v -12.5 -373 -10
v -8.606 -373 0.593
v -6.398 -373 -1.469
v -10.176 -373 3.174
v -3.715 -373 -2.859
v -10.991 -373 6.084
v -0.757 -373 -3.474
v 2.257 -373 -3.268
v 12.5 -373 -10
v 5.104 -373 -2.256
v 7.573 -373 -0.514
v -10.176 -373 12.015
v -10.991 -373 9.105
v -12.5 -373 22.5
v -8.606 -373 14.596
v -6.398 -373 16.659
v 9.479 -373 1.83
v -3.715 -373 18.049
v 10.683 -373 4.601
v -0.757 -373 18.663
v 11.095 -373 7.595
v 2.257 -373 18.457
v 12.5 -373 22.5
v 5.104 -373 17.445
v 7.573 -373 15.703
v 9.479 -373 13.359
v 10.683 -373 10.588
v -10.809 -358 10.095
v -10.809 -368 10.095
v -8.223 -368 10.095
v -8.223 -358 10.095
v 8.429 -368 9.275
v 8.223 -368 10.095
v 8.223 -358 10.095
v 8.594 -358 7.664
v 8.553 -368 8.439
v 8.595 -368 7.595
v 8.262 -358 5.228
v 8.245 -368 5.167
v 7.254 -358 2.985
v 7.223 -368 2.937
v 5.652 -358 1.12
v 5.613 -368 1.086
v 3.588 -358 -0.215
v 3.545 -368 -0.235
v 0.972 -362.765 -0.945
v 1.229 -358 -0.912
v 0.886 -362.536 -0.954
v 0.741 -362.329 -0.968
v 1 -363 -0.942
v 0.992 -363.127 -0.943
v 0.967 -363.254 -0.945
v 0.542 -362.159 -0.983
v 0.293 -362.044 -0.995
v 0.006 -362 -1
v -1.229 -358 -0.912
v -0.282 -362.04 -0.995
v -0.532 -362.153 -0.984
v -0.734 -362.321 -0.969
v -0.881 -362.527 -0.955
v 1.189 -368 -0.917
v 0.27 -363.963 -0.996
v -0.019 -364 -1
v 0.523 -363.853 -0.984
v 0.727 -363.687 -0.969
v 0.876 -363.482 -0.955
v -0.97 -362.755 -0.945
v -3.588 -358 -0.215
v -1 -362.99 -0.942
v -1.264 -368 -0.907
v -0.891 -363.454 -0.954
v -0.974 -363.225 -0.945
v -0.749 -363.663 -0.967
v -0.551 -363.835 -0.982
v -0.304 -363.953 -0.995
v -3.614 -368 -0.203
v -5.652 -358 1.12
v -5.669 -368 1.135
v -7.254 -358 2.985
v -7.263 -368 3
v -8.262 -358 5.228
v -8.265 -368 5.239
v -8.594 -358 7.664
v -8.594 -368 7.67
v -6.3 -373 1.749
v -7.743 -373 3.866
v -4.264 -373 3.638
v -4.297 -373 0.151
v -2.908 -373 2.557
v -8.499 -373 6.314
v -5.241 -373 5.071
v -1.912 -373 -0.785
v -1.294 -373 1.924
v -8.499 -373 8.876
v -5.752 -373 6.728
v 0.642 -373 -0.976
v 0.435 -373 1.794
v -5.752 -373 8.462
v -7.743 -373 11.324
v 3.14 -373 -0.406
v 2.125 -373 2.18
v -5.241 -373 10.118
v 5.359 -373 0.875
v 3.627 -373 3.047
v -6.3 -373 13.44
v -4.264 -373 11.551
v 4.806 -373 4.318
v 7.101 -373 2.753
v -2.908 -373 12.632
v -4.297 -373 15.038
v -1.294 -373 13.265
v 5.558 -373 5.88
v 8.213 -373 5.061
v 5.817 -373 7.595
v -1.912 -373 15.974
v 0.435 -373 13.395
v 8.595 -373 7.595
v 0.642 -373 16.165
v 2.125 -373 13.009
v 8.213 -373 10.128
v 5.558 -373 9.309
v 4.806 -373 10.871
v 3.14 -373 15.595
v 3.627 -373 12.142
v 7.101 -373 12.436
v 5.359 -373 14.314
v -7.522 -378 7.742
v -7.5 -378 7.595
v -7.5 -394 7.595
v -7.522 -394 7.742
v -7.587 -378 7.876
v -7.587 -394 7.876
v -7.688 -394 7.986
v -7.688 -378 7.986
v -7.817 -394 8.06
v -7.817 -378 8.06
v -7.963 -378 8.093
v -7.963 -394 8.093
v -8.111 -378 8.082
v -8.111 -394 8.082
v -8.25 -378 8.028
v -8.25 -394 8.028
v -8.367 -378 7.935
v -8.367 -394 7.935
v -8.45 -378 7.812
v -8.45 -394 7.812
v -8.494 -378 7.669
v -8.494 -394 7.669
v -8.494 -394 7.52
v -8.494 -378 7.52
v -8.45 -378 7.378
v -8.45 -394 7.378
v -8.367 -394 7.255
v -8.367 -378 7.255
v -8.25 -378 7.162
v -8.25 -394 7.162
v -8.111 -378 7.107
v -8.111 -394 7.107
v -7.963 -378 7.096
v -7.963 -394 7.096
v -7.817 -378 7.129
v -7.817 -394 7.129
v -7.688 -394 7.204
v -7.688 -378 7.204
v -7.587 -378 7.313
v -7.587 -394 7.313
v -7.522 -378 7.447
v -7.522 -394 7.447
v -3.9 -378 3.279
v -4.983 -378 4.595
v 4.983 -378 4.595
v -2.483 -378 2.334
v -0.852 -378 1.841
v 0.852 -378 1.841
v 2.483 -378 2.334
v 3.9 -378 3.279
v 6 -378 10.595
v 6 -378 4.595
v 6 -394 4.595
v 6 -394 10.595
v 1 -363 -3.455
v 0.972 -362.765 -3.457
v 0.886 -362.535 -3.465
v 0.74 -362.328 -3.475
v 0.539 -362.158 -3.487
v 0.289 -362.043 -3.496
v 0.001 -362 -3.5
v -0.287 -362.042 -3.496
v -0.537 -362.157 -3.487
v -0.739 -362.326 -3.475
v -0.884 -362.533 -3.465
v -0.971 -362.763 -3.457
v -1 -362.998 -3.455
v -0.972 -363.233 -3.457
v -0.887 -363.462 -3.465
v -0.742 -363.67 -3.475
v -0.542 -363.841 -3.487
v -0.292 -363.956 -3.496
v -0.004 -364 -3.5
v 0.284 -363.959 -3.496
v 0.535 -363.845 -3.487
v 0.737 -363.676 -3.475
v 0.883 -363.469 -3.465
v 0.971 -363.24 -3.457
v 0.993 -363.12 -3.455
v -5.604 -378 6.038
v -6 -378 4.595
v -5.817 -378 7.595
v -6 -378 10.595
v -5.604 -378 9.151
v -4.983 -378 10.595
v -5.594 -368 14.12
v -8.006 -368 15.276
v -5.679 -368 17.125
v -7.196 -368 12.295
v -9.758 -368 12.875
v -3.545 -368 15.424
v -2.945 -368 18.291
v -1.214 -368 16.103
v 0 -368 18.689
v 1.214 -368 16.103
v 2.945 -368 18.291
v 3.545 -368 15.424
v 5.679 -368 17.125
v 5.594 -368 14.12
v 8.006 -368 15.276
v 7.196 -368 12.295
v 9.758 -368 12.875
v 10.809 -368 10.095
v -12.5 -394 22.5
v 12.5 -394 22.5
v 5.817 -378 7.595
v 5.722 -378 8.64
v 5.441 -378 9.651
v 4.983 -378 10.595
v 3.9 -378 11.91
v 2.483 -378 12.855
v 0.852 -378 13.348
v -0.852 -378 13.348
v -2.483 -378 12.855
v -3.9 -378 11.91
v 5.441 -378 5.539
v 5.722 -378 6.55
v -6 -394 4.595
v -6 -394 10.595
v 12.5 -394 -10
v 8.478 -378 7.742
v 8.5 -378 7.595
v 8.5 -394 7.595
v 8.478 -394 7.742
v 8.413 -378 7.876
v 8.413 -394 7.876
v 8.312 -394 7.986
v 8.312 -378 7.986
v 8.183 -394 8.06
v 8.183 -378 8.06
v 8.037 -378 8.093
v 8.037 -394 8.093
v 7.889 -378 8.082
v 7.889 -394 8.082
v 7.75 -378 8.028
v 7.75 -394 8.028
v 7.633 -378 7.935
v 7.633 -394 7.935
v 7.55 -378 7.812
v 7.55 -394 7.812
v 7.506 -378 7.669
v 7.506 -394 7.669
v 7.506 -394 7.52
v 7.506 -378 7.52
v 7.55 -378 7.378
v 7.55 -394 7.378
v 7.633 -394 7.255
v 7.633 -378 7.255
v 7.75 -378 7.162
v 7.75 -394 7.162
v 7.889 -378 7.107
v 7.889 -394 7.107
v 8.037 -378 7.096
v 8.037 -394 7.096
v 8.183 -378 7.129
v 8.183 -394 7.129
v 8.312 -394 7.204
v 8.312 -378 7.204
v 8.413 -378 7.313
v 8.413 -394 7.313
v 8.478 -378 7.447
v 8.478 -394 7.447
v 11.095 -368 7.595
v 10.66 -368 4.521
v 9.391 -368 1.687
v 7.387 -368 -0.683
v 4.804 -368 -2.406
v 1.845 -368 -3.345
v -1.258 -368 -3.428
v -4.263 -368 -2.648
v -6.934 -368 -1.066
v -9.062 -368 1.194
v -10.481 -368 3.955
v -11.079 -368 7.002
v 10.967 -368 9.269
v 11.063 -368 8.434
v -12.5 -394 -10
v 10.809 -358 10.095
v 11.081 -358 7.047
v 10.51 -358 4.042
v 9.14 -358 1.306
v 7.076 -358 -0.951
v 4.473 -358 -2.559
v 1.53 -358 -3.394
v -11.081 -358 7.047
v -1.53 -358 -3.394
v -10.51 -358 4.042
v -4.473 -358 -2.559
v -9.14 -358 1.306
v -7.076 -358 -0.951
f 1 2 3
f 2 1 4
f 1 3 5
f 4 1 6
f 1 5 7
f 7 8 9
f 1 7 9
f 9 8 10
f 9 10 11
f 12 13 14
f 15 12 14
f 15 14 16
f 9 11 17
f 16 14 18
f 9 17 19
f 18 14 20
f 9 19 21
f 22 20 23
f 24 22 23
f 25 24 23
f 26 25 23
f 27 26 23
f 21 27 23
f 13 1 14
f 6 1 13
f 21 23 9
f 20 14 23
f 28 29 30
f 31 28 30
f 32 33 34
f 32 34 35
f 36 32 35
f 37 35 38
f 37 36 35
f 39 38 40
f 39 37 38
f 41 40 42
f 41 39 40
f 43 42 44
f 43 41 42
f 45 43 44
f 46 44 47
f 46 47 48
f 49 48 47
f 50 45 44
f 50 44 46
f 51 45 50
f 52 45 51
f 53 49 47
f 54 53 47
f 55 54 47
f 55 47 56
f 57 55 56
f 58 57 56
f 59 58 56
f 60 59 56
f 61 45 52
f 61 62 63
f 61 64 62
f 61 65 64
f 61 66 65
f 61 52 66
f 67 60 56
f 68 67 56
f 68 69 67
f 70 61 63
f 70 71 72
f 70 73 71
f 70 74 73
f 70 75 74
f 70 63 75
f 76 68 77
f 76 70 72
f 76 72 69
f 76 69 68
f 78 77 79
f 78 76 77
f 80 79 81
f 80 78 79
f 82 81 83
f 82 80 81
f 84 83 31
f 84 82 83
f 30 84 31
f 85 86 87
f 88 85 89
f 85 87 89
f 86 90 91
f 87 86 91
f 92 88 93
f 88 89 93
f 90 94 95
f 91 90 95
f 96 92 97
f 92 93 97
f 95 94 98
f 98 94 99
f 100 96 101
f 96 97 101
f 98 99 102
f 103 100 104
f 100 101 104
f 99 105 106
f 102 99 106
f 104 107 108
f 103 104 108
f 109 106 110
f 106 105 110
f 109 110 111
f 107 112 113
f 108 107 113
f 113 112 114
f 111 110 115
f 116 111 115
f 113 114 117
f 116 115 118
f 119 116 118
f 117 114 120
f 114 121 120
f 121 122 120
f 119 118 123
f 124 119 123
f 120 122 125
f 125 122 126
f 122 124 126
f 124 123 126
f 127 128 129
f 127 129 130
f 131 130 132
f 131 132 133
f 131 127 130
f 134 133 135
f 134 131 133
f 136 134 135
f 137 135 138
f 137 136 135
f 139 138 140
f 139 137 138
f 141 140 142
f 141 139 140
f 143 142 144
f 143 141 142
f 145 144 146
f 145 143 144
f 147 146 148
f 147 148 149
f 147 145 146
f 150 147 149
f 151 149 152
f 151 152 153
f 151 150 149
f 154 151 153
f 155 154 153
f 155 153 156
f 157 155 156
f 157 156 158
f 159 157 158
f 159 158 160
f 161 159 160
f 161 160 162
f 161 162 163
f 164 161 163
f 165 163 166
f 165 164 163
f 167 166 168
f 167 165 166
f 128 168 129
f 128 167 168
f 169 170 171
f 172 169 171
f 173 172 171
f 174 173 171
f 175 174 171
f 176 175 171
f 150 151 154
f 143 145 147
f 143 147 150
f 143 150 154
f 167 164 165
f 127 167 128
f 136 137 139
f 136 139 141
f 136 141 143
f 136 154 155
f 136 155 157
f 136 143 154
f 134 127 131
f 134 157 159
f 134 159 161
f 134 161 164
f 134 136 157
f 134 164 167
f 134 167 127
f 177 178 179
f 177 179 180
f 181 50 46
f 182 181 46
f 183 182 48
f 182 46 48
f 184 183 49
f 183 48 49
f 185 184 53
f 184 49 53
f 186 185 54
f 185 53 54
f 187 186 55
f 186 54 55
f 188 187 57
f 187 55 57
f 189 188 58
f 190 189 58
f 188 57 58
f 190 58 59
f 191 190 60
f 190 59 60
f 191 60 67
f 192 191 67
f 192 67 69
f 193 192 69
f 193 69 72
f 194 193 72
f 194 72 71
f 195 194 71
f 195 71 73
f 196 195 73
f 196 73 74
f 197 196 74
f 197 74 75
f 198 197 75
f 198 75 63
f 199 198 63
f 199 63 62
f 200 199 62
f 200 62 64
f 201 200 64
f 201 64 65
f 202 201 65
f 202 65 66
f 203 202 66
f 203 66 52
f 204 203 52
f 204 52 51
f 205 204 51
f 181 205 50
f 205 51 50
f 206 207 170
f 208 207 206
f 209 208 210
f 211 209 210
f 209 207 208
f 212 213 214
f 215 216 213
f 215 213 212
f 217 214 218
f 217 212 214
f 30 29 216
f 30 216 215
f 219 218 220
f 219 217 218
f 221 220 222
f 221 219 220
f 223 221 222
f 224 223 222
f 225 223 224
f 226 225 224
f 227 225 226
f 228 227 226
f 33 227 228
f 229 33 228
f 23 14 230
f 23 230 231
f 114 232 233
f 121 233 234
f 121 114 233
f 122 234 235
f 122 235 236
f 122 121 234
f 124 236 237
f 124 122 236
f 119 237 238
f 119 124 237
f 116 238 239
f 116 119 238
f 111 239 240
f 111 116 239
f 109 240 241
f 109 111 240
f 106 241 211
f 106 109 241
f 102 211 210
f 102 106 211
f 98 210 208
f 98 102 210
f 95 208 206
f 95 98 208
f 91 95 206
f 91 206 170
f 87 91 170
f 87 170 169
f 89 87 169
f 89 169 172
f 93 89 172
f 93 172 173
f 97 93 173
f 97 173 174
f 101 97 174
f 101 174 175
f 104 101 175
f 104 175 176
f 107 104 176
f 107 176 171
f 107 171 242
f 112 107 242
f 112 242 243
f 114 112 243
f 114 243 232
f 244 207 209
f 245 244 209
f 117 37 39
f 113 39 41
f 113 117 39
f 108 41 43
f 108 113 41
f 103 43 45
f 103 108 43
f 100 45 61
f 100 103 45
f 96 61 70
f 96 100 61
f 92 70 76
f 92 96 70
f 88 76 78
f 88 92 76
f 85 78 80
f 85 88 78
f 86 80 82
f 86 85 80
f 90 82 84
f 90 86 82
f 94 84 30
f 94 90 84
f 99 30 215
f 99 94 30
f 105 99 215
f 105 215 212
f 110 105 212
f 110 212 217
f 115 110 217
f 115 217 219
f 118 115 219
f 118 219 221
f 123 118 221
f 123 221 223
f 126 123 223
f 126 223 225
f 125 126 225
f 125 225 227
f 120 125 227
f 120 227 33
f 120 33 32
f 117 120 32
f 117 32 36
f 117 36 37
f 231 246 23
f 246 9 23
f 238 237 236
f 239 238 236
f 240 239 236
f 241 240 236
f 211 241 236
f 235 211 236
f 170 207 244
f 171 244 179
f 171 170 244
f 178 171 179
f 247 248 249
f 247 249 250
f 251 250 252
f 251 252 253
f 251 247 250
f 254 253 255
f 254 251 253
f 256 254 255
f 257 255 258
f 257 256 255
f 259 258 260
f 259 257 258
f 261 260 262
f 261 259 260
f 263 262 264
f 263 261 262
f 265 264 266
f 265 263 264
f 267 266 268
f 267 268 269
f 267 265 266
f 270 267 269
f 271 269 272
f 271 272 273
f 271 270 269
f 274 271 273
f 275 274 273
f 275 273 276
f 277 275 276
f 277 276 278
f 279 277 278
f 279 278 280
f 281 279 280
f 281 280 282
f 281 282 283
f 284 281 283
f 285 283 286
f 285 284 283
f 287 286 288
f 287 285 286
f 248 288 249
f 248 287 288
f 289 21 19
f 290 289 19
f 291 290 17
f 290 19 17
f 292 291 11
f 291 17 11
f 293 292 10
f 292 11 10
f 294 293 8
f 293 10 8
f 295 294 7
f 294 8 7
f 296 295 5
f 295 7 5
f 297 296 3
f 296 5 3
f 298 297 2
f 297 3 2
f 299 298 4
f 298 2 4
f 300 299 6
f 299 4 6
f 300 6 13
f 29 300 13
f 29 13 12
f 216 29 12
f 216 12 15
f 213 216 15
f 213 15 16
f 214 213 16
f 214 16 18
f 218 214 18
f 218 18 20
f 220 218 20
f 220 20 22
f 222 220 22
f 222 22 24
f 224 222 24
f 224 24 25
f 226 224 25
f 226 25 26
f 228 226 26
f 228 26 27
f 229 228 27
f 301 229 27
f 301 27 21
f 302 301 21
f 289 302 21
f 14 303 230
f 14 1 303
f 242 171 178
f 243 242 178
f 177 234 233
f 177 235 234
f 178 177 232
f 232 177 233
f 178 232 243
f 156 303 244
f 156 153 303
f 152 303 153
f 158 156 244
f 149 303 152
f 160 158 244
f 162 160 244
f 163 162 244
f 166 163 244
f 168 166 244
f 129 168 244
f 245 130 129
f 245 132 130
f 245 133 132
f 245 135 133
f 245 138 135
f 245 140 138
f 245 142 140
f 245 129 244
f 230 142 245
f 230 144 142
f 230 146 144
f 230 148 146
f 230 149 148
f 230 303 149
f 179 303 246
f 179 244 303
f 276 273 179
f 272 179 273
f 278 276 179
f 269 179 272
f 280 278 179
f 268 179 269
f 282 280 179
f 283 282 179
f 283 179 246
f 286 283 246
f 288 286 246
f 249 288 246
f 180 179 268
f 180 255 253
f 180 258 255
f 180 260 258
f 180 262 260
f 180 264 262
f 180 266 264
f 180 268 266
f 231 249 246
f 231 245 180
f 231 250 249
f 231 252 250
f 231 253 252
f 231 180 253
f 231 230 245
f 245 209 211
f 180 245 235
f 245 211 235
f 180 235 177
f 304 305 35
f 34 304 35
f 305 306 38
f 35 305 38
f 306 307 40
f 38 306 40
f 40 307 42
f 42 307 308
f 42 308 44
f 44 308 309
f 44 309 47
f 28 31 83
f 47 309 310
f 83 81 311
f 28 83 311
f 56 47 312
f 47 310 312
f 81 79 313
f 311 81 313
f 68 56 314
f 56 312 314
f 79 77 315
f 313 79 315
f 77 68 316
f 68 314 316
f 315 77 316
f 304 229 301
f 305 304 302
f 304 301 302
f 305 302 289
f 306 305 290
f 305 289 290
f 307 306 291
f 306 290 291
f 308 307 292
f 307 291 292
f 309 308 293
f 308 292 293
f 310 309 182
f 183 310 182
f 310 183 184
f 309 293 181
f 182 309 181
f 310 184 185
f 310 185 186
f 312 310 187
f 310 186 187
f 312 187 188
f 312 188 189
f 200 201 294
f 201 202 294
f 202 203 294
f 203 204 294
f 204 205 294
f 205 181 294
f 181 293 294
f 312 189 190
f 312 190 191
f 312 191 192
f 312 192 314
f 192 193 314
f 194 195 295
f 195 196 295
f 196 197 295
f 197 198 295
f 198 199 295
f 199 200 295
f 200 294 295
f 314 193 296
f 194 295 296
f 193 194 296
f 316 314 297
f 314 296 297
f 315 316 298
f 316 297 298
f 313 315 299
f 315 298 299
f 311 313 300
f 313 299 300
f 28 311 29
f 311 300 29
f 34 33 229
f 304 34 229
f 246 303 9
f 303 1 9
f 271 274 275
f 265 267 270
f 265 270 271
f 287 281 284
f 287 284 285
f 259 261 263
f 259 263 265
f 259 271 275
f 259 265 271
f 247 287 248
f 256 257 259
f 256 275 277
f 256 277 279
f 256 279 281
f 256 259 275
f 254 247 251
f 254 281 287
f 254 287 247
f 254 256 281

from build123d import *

# Parameters (mm, degrees)
SKETCH023_W     = 25
SKETCH023_H     = 32.5
SKETCH023_R     = 5.8166
PAD011_DEPTH    = 5
SKETCH024_R     = 11.0946
SKETCH024_R_2   = 8.5946
PAD012_DEPTH    = 5
SKETCH025_W     = 25
SKETCH025_H     = 32.5
SKETCH025_R     = 0.5
SKETCH025_W_2   = 12
SKETCH025_H_2   = 6
PAD013_DEPTH    = 16
PAD020_DEPTH    = 10
SKETCH035_R     = 1
POCKET007_DEPTH = 16


with BuildPart() as part:
    # Sketch023 → Pad011 (new body)
    with BuildSketch(Plane.XZ):
        with Locations((0, 6.25)):
            Rectangle(SKETCH023_W, SKETCH023_H)
        with Locations((0, 7.5946)):
            Circle(SKETCH023_R, mode=Mode.SUBTRACT)
    extrude(amount=PAD011_DEPTH)

    # Sketch024 (on Face6 of Pad011) → Pad012 (join)
    with BuildSketch(Plane(origin=(0, 0, 0), x_dir=(1, 0, 0), z_dir=(0, 1, 0))):
        with Locations((0, -7.5946)):
            Circle(SKETCH024_R)
        with Locations((0, -7.5946)):
            Circle(SKETCH024_R_2, mode=Mode.SUBTRACT)
    extrude(amount=PAD012_DEPTH)

    # Sketch025 (on Face5 of Pad012) → Pad013 (join)
    with BuildSketch(Plane.XZ.offset(5)):
        with Locations((0, 6.25)):
            Rectangle(SKETCH025_W, SKETCH025_H)
        with Locations((-8, 7.5946)):
            Circle(SKETCH025_R, mode=Mode.SUBTRACT)
        with Locations((8, 7.5946)):
            Circle(SKETCH025_R, mode=Mode.SUBTRACT)
        with Locations((0, 7.5946)):
            Rectangle(SKETCH025_W_2, SKETCH025_H_2, mode=Mode.SUBTRACT)
    extrude(amount=PAD013_DEPTH)

    # Sketch034 → Pad020 (join)
    with BuildSketch(Plane(origin=(0, 5, 0), x_dir=(1, 0, 0), z_dir=(0, 1, 0))):
        with BuildLine():
            ThreePointArc((8.222965, -10.0946), (0, 1), (-8.222965, -10.0946))
            Line((-10.809262, -10.0946), (-8.222965, -10.0946))
            ThreePointArc((10.809262, -10.0946), (0, 3.5), (-10.809262, -10.0946))
            Line((8.222965, -10.0946), (10.809262, -10.0946))
        make_face()
    extrude(amount=PAD020_DEPTH)

    # Sketch035 → Pocket007 (cut)
    with BuildSketch(Plane.XY):
        with Locations((0, 10)):
            Circle(SKETCH035_R)
    extrude(amount=-POCKET007_DEPTH, mode=Mode.SUBTRACT)


with BuildPart() as part_1:
    # Body005 placement: moved
    add(part.part.moved(Location((0, -373, 0))))


solid = part_1.part
